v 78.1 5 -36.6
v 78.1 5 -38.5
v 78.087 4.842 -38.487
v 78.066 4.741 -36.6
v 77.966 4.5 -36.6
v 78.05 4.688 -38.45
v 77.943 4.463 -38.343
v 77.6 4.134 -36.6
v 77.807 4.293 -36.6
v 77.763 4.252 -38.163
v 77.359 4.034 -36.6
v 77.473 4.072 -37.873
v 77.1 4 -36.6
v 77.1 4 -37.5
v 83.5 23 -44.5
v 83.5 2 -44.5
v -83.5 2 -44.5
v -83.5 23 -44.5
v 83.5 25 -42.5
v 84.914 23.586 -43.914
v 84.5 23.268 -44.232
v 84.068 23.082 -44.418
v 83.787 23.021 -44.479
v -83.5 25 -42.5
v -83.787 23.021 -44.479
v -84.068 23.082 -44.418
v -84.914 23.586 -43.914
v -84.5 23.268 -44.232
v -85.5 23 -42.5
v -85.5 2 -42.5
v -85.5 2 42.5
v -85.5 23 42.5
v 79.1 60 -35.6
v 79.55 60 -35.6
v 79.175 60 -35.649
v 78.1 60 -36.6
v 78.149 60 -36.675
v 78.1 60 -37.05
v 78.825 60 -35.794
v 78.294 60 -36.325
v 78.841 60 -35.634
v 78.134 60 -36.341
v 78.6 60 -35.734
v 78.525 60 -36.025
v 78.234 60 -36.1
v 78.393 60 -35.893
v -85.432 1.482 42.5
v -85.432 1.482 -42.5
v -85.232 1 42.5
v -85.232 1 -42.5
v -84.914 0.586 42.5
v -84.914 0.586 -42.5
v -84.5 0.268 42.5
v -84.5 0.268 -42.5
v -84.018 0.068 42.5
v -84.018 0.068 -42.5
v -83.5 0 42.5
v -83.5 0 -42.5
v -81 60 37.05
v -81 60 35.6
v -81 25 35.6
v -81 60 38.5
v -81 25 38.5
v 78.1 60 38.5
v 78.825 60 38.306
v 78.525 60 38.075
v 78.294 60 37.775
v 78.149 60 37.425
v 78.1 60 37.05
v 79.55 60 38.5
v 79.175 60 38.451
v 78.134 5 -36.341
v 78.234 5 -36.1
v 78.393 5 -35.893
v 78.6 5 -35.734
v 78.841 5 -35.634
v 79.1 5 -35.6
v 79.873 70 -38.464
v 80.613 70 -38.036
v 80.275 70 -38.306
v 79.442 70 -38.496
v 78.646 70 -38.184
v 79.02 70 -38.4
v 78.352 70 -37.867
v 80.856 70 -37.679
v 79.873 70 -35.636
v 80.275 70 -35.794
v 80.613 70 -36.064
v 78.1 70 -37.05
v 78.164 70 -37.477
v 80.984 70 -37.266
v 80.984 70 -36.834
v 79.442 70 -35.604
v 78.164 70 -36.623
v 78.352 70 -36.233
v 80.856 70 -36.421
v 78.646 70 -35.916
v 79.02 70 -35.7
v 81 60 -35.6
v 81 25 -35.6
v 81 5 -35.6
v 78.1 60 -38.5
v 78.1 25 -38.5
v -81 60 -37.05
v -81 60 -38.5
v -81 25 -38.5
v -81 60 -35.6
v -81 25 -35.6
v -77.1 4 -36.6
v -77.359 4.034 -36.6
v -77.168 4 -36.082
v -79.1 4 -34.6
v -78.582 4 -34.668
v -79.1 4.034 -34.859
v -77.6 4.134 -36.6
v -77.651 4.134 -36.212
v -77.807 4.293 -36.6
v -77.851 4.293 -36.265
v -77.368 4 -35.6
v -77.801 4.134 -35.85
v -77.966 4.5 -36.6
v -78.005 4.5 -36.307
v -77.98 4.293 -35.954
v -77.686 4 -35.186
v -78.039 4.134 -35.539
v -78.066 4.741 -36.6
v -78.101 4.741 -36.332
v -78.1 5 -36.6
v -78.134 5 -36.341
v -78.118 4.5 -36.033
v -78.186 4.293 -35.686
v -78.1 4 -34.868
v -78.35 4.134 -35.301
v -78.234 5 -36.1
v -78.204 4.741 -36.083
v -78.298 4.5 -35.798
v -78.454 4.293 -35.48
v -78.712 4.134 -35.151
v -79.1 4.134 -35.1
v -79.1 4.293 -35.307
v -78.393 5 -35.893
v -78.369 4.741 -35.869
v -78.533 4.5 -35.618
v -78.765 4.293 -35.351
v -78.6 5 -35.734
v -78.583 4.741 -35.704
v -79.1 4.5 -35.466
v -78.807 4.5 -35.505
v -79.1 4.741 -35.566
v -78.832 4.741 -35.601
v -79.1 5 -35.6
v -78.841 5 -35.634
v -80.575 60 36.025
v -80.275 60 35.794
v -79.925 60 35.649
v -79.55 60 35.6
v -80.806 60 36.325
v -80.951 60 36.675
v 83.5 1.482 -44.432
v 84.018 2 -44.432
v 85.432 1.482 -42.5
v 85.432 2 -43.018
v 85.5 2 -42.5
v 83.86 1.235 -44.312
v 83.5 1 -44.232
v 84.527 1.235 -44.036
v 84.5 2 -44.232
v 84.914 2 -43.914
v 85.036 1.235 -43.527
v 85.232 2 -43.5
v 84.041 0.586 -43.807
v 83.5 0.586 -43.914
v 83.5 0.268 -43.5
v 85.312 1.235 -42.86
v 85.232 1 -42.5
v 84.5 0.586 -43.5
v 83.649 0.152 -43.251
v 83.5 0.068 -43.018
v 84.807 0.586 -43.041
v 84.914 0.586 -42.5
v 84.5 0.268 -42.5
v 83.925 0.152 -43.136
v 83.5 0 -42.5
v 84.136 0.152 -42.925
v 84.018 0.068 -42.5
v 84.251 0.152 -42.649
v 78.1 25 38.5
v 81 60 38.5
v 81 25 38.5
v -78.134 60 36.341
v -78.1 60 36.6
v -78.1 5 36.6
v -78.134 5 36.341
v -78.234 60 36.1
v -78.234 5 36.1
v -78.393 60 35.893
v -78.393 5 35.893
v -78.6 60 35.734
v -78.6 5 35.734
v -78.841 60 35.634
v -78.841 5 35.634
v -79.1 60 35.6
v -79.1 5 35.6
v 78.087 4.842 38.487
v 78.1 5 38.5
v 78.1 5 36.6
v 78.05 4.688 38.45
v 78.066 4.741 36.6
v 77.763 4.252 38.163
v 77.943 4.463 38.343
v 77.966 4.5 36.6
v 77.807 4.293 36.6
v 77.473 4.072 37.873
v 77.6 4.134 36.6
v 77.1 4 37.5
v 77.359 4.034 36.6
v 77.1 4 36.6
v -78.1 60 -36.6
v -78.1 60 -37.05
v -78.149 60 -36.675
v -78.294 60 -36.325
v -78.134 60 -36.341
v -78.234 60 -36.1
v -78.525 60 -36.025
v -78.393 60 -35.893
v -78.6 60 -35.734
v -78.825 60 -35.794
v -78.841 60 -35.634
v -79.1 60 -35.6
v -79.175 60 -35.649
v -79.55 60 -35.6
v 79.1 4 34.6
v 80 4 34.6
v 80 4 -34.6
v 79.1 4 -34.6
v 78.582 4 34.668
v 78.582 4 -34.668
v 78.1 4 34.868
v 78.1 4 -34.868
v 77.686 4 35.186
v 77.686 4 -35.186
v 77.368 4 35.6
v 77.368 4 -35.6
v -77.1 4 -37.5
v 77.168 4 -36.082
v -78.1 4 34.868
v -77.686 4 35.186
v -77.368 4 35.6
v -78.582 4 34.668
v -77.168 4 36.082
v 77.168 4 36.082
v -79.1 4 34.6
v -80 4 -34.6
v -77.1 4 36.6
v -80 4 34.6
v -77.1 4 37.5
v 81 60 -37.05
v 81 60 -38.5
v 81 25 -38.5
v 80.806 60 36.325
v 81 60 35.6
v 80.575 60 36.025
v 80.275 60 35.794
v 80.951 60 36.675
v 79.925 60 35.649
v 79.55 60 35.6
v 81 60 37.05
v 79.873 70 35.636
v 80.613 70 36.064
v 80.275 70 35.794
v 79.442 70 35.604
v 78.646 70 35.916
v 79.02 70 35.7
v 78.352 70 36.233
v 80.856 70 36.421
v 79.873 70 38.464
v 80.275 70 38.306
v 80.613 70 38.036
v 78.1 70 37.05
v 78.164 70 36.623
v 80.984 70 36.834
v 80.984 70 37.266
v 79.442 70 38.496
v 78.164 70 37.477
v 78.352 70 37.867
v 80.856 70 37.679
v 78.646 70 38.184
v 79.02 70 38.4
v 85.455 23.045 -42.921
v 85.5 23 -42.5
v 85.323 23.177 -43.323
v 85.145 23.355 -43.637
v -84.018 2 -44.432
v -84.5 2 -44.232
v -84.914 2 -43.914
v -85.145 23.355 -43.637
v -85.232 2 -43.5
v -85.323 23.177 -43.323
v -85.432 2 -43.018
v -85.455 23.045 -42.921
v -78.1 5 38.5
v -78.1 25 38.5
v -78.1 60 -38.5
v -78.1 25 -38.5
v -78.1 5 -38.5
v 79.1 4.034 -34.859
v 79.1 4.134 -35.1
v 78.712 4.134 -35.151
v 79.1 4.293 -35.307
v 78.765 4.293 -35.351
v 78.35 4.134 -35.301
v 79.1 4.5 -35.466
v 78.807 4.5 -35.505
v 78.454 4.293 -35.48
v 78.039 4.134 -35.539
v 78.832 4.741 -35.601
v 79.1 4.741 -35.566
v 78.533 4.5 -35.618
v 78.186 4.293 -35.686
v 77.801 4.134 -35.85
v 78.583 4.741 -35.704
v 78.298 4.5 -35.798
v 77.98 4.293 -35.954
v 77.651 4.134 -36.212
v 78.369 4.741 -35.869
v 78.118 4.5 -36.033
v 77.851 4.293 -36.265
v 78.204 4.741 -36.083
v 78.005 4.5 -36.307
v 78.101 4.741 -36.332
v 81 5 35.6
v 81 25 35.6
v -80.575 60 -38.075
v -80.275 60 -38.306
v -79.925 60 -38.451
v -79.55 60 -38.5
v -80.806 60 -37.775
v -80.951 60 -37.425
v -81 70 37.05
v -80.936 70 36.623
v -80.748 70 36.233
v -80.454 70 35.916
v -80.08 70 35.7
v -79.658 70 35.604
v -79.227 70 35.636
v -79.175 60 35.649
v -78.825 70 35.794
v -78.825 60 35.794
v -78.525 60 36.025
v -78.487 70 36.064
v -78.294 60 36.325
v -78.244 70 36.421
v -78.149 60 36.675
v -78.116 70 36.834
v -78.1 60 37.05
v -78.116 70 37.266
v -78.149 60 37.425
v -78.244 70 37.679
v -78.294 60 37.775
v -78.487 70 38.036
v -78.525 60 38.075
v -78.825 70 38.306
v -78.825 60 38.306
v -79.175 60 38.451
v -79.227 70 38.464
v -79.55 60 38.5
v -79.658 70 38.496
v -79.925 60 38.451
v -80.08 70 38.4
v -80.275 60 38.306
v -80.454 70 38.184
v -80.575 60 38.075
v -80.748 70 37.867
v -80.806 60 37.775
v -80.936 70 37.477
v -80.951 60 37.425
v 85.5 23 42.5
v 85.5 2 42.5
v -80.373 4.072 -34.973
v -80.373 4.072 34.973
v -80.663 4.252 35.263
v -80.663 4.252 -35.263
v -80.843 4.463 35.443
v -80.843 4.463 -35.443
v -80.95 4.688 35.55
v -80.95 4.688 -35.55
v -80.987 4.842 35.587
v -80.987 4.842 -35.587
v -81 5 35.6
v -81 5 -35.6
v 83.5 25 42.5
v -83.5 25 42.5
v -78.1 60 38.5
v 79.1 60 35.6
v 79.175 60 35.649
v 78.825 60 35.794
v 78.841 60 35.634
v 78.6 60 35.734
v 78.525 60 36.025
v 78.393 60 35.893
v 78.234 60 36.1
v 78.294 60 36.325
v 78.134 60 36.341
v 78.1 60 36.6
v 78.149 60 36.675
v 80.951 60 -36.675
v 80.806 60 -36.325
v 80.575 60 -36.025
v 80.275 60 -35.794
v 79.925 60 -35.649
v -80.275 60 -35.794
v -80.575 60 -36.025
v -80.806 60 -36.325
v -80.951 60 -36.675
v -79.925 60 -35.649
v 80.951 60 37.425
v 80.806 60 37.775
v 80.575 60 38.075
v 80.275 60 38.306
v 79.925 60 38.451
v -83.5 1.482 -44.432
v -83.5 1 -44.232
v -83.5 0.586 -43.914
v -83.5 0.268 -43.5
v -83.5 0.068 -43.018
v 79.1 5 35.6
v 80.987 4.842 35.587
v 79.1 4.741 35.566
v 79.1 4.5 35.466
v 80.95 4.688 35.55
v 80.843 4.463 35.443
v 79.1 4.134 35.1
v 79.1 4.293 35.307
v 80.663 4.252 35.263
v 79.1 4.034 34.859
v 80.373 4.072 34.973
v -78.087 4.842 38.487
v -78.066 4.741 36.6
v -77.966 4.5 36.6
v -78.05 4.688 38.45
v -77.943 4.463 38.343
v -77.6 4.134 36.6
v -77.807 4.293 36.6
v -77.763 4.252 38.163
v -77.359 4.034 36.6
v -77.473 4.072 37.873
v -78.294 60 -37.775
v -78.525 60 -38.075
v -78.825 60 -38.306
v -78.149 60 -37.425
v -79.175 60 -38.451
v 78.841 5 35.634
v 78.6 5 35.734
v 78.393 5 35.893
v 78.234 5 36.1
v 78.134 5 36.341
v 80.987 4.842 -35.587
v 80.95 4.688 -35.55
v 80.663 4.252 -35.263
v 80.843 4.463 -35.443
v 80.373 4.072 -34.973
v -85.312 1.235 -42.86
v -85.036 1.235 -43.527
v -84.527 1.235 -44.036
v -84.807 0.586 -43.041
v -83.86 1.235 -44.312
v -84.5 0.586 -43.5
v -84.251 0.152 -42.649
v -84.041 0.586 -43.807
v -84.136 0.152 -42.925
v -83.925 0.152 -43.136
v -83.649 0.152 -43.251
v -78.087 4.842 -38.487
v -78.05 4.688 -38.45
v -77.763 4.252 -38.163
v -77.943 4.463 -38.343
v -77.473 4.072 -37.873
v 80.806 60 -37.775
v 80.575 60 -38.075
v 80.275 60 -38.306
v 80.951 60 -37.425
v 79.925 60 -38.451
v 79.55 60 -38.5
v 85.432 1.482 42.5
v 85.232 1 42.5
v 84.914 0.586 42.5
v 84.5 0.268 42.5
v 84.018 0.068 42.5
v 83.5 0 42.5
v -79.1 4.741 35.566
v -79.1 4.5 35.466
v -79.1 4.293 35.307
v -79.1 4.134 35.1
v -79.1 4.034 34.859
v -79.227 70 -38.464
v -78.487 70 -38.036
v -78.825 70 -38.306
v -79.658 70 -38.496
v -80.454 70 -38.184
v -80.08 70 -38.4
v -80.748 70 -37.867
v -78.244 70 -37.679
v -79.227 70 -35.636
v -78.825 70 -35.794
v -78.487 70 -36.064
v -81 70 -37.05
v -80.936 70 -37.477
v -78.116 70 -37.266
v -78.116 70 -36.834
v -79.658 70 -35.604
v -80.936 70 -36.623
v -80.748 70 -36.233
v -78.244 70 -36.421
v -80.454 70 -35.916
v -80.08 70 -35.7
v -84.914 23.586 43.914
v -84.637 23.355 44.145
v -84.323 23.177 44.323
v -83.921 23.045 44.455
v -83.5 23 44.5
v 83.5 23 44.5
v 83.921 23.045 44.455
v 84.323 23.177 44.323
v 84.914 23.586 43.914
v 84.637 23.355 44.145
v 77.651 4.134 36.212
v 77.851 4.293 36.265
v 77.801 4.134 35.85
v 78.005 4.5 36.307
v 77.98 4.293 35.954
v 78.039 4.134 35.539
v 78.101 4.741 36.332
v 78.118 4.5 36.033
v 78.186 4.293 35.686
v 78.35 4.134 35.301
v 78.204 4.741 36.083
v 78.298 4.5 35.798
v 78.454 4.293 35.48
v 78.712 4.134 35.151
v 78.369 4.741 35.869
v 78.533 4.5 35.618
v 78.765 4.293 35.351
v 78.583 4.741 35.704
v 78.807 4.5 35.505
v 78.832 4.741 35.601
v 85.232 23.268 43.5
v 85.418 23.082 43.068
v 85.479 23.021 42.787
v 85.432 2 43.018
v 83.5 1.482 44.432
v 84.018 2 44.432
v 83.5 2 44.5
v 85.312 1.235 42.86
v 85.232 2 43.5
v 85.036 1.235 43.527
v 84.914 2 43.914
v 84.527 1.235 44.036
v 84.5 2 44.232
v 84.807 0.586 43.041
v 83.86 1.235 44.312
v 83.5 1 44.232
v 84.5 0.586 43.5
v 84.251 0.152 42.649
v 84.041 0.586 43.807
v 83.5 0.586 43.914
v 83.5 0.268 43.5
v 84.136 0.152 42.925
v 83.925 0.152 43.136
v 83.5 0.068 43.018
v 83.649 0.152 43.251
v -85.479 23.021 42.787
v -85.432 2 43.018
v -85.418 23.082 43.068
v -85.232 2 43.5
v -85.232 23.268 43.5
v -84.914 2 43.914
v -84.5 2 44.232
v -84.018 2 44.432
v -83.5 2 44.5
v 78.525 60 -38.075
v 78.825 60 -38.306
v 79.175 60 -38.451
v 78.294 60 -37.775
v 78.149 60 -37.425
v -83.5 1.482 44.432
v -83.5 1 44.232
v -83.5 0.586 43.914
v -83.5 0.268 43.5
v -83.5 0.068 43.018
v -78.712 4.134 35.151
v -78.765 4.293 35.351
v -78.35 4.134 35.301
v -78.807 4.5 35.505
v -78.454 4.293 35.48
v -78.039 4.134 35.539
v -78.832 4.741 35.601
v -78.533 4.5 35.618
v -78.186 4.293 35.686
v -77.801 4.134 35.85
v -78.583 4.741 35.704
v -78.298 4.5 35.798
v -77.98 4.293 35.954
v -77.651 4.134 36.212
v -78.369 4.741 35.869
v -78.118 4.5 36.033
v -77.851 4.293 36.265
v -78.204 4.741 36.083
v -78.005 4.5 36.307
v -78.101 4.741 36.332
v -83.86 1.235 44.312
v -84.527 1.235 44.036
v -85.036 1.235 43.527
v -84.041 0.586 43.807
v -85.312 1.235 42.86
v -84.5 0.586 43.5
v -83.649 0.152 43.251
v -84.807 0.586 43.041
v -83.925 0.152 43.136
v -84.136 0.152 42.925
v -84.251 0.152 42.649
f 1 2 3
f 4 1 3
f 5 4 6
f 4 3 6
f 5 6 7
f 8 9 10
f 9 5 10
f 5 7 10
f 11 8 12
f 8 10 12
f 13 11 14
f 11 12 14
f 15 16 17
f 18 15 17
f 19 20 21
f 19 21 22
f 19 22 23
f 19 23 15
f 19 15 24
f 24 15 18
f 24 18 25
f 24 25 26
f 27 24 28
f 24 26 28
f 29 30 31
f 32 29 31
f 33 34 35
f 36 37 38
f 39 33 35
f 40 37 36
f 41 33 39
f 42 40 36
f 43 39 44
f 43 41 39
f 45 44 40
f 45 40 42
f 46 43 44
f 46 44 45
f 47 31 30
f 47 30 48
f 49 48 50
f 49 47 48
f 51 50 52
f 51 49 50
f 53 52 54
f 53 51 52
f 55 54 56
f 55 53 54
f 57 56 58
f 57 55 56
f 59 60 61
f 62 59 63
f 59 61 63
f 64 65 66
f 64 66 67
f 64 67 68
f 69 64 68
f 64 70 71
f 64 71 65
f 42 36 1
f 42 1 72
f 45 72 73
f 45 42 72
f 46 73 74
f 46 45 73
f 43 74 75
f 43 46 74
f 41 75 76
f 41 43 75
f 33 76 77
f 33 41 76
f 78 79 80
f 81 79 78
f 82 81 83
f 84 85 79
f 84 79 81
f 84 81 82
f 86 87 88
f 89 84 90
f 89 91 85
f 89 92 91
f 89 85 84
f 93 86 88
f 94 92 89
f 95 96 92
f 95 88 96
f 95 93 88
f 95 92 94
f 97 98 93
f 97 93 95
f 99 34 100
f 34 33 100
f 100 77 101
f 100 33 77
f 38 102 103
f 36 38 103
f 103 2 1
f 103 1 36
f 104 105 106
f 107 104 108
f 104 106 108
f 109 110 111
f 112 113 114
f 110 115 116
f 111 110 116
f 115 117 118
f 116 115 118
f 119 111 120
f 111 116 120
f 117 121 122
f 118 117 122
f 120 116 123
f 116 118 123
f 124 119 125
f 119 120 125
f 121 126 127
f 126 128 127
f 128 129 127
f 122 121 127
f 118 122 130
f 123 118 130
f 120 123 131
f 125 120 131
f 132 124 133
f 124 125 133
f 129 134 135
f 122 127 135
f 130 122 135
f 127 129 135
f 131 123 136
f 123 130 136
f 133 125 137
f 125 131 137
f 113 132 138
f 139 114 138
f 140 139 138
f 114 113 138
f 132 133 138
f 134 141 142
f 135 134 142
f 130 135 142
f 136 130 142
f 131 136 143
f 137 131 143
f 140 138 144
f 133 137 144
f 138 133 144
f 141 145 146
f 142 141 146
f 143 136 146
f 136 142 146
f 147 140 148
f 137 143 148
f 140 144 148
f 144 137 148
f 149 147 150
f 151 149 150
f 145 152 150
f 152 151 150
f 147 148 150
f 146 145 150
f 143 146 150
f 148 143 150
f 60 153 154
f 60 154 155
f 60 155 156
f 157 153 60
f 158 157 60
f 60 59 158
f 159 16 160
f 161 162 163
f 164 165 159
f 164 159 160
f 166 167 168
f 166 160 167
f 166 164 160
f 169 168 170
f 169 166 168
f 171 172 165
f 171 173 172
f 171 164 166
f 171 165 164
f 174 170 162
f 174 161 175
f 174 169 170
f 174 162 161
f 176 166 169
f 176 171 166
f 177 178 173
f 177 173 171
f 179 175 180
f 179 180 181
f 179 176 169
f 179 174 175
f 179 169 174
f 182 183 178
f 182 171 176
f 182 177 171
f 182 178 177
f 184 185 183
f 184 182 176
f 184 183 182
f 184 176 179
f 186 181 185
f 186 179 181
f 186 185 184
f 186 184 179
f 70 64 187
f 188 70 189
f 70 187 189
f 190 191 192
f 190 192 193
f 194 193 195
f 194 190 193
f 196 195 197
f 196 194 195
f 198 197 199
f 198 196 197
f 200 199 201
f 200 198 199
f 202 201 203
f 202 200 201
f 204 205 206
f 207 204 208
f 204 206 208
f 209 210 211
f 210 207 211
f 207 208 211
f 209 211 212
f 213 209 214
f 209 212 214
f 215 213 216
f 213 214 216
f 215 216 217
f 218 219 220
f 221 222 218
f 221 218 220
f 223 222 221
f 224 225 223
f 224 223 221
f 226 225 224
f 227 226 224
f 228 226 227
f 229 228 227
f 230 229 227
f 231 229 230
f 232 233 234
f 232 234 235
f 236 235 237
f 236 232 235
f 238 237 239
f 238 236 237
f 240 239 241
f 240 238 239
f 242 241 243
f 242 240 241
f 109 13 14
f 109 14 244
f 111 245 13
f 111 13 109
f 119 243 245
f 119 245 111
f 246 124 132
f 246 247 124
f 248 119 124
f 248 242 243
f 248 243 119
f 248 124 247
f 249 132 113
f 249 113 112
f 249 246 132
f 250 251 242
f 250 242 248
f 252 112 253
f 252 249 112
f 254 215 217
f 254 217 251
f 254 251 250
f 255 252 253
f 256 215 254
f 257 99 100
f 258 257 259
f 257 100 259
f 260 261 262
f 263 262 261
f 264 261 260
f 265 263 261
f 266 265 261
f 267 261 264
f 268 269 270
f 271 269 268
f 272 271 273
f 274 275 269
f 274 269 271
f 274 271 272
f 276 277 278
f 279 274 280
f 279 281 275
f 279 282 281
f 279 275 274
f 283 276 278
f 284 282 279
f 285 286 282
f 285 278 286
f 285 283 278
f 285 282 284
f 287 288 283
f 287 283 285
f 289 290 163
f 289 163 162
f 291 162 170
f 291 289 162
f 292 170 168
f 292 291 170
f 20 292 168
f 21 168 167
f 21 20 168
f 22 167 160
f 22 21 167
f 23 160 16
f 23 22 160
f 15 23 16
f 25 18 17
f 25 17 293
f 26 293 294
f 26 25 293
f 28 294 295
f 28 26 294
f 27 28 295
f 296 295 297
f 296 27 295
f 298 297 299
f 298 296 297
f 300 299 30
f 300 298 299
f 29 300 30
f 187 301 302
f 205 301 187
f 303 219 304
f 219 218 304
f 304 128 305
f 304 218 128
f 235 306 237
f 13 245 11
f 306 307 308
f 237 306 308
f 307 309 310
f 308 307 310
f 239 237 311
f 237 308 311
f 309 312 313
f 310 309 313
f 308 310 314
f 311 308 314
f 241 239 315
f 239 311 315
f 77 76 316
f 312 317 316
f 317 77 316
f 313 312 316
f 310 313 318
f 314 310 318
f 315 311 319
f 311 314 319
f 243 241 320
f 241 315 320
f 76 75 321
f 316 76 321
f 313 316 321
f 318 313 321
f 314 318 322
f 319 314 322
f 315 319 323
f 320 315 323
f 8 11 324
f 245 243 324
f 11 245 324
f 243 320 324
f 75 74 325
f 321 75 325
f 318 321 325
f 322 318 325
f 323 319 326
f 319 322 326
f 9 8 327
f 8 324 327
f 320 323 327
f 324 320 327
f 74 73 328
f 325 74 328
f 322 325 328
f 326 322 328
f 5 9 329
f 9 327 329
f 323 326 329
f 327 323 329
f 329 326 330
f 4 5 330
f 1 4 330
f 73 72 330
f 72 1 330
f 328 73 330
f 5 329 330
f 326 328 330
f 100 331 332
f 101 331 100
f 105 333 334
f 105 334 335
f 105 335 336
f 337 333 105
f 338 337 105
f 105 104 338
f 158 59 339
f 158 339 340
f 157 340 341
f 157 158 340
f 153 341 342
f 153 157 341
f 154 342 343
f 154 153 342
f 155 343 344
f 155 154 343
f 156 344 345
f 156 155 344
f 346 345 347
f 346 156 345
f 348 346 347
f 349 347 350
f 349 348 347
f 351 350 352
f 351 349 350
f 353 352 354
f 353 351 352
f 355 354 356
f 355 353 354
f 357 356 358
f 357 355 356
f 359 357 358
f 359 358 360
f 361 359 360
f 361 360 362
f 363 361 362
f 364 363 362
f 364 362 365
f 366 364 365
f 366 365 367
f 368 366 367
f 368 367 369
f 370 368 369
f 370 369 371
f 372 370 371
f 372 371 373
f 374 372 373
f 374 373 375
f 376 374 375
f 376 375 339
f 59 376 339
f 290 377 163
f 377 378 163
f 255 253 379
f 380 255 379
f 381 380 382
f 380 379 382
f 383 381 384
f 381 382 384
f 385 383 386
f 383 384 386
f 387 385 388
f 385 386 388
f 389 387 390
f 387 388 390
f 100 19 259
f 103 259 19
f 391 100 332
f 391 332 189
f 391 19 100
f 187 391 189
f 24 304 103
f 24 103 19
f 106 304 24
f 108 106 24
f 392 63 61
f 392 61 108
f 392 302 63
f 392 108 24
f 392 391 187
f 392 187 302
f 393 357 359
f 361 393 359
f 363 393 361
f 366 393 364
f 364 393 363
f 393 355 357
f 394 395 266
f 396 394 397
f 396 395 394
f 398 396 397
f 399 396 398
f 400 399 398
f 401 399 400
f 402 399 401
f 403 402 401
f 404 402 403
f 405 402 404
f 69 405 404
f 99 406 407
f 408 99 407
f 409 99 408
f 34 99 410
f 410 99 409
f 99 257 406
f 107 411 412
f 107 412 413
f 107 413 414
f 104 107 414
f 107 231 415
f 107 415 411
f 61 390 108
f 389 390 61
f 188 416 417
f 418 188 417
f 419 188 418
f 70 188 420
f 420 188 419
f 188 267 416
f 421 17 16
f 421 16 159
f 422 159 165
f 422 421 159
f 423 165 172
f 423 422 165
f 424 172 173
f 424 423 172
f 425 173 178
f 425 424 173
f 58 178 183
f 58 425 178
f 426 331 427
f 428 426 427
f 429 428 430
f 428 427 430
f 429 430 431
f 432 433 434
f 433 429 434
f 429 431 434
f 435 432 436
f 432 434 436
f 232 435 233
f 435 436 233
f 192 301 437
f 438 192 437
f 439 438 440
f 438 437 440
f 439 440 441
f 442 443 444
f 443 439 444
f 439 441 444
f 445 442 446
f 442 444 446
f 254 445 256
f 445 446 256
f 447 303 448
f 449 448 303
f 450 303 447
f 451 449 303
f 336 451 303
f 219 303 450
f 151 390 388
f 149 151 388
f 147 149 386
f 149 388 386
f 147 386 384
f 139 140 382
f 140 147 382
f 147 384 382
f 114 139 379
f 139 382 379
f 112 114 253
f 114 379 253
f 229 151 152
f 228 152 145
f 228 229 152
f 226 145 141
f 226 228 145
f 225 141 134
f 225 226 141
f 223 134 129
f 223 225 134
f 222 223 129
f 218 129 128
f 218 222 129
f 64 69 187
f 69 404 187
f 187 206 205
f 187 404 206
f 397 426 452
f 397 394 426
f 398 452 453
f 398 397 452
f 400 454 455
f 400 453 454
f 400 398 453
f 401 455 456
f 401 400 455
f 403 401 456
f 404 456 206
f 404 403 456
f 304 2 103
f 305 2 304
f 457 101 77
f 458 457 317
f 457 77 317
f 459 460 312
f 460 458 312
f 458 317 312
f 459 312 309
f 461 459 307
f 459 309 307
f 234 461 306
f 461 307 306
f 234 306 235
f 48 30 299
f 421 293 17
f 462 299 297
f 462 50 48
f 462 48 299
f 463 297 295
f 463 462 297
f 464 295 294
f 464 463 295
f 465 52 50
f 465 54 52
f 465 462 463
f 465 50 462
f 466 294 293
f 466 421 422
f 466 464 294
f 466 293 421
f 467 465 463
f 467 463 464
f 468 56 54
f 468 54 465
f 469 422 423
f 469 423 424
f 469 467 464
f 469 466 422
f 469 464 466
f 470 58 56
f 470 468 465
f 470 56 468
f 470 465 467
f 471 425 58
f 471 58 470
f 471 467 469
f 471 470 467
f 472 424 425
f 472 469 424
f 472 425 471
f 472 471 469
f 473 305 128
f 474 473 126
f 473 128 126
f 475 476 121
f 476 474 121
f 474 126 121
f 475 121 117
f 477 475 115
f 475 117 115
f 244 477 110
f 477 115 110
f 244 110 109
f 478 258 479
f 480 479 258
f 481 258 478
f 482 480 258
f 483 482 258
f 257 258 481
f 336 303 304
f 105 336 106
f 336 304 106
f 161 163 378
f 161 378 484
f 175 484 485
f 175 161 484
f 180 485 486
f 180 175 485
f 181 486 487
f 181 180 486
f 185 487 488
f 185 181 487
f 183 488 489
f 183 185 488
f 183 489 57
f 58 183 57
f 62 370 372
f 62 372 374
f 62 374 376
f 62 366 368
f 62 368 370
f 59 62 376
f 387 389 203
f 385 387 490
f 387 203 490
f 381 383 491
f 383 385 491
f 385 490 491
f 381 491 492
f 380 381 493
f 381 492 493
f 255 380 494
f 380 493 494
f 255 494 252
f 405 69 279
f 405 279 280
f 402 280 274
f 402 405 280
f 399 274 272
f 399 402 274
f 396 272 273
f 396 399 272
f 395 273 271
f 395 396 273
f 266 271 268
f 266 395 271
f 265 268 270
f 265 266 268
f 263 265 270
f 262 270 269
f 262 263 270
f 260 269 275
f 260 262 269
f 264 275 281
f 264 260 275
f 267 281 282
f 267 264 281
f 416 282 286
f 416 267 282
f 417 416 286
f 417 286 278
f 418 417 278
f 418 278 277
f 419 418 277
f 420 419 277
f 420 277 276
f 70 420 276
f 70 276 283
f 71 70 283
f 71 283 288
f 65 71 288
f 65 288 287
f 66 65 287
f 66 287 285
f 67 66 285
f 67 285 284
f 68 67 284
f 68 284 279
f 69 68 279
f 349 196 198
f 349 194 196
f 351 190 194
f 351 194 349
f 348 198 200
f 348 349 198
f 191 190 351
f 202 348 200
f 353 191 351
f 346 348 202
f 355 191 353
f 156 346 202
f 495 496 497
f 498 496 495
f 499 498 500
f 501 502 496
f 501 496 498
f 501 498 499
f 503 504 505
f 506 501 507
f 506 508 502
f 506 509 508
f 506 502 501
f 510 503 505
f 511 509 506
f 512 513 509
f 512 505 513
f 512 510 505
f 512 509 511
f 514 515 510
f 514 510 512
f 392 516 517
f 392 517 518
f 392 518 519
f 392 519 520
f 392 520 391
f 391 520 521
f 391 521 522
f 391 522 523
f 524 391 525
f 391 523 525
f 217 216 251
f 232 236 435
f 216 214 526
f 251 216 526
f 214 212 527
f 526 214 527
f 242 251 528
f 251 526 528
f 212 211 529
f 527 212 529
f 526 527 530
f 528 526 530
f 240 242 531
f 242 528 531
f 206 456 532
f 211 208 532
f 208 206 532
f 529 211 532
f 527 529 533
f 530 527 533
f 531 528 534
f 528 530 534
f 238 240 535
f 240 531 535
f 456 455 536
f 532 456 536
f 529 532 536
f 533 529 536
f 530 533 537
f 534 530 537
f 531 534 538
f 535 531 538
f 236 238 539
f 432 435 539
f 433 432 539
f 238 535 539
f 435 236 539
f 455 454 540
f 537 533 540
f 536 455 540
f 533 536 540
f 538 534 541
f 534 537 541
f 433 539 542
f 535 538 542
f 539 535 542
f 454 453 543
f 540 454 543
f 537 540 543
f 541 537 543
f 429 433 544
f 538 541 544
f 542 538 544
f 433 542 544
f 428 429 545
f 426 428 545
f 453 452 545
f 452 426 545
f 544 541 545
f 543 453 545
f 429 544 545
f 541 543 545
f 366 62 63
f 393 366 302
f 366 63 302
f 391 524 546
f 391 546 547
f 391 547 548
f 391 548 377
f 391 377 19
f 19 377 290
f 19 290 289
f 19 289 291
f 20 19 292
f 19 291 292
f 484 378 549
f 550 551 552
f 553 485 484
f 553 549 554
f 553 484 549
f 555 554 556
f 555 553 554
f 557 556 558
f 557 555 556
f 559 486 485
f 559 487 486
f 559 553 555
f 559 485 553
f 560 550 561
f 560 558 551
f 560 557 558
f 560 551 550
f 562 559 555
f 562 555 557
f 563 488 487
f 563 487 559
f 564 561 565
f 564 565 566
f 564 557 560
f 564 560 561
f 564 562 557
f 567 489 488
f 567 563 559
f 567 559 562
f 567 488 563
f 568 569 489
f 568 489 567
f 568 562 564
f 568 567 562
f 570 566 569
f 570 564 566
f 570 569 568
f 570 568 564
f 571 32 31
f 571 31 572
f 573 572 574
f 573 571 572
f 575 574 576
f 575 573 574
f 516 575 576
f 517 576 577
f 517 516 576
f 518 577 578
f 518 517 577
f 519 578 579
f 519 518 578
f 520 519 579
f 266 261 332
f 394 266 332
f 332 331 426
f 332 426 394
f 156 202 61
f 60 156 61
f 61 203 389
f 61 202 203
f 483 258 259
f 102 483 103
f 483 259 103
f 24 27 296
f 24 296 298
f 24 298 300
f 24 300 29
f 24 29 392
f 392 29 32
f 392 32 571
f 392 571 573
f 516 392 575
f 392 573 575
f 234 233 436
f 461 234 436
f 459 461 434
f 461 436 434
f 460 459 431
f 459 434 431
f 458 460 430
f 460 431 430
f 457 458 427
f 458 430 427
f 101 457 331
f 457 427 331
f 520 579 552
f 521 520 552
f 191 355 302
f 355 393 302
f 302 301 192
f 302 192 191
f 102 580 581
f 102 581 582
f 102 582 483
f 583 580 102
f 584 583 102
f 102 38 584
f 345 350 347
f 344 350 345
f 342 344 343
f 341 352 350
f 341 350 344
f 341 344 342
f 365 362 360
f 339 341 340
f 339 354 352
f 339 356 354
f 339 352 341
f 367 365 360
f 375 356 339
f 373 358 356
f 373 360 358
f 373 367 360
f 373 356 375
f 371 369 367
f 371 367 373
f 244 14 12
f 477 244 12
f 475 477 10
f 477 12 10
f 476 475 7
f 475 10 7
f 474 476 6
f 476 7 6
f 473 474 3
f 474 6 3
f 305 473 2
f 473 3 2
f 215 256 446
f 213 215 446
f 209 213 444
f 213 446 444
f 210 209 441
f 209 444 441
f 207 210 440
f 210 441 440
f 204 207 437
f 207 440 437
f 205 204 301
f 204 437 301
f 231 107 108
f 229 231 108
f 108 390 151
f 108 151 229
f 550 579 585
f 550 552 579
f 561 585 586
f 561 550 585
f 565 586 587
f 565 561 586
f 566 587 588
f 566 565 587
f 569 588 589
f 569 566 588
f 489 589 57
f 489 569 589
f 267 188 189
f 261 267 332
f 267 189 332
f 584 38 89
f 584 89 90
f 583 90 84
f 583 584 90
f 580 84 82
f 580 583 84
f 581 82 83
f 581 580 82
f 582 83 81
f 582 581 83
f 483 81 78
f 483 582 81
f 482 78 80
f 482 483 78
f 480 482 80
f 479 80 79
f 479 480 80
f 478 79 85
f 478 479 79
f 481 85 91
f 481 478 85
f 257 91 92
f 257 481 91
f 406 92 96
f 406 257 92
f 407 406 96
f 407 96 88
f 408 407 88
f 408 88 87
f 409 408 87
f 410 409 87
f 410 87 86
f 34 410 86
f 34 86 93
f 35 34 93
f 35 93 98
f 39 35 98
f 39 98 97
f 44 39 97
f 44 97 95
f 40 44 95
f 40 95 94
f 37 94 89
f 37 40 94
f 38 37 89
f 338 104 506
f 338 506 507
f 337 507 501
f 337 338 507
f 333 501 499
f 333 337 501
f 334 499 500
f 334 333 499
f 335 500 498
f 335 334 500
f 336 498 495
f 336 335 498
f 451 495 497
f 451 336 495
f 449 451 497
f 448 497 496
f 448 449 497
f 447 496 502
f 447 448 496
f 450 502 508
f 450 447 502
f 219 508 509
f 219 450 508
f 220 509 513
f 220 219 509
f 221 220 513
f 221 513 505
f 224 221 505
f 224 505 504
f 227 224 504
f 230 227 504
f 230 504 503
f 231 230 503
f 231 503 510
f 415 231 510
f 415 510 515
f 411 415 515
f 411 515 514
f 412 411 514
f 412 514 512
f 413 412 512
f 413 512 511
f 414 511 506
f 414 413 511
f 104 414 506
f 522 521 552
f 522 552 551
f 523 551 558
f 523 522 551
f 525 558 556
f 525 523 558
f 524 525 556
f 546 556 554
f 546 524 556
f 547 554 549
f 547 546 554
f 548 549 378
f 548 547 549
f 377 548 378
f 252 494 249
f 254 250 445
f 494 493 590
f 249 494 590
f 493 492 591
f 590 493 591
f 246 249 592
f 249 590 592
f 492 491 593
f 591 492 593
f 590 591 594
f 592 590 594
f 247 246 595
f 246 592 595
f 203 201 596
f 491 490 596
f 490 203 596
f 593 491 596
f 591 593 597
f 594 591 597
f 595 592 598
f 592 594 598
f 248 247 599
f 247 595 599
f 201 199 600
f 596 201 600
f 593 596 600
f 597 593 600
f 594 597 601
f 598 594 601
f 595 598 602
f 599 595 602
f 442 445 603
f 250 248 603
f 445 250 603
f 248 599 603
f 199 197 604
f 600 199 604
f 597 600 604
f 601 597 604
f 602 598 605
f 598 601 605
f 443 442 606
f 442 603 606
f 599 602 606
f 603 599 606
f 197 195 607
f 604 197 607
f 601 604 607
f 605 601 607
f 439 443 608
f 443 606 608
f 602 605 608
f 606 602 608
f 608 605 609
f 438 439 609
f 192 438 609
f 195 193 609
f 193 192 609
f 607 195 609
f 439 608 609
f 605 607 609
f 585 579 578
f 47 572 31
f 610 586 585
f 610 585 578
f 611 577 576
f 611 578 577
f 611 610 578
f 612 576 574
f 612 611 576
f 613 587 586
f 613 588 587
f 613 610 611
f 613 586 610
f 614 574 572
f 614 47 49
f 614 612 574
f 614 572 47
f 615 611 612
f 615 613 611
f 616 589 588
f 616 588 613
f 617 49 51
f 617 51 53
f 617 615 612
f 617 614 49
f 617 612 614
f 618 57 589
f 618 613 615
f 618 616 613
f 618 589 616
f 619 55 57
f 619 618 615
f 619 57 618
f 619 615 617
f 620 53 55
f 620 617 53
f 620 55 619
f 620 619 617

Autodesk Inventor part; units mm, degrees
ref_plane "YZ Plane" through (0, 0, 0) normal (1, 0, 0) x (0, 1, 0)
ref_plane "XZ Plane" through (0, 0, 0) normal (0, 1, 0) x (-1, 0, 0)
ref_plane "XY Plane" through (0, 0, 0) normal (0, 0, 1) x (1, 0, 0)
sketch "Sketch1" plane through (0, 0, 0) normal (0, 1, 0) x (-1, 0, 0)
  line L0 (-85.5, -44.5) -> (85.5, -44.5)
  line L1 (85.5, -44.5) -> (85.5, 44.5)
  line L2 (85.5, 44.5) -> (-85.5, 44.5)
  line L3 (-85.5, 44.5) -> (-85.5, -44.5)
  line L4 (-85.5, -44.5) -> (85.5, 44.5) construction
  line L5 (85.5, -44.5) -> (-85.5, 44.5) construction
  line L6 (-81, -38.5) -> (81, -38.5)
  line L7 (81, -38.5) -> (81, 38.5)
  line L8 (81, 38.5) -> (-81, 38.5)
  line L9 (-81, 38.5) -> (-81, -38.5)
  line L10 (-81, -38.5) -> (81, 38.5) construction
  line L11 (81, -38.5) -> (-81, 38.5) construction
  line L12 (81, 38.5) -> (79.55, 38.5)
  line L13 (81, 37.05) -> (81, 38.5)
  circle A0 centre (79.55, 37.05) radius 1.45
  circle A1 centre (79.55, -37.05) radius 1.45
  circle A2 centre (-79.55, -37.05) radius 1.45
  circle A3 centre (-79.55, 37.05) radius 1.45
  line L14 (81, 38.5) -> (78.1, 38.5)
  line L15 (78.1, 38.5) -> (78.1, 35.6)
  line L16 (78.1, 35.6) -> (81, 35.6)
  line L17 (81, 35.6) -> (81, 38.5)
  line L18 (81, 38.5) -> (78.1, 35.6) construction
  line L19 (78.1, 38.5) -> (81, 35.6) construction
  line L20 (81, -35.6) -> (78.1, -35.6)
  line L21 (78.1, -35.6) -> (78.1, -38.5)
  line L22 (78.1, -38.5) -> (81, -38.5)
  line L23 (81, -38.5) -> (81, -35.6)
  line L24 (81, -35.6) -> (78.1, -38.5) construction
  line L25 (78.1, -35.6) -> (81, -38.5) construction
  line L26 (-78.1, -35.6) -> (-81, -35.6)
  line L27 (-81, -35.6) -> (-81, -38.5)
  line L28 (-81, -38.5) -> (-78.1, -38.5)
  line L29 (-78.1, -38.5) -> (-78.1, -35.6)
  line L30 (-78.1, -35.6) -> (-81, -38.5) construction
  line L31 (-81, -35.6) -> (-78.1, -38.5) construction
  line L32 (-78.1, 38.5) -> (-81, 38.5)
  line L33 (-81, 38.5) -> (-81, 35.6)
  line L34 (-81, 35.6) -> (-78.1, 35.6)
  line L35 (-78.1, 35.6) -> (-78.1, 38.5)
  line L36 (-78.1, 38.5) -> (-81, 35.6) construction
  line L37 (-81, 38.5) -> (-78.1, 35.6) construction
  point P0 (0, 0)
  point P1 (-79.55, 38.5)
  point P2 (-81, 37.05)
  point P3 (-81, -37.05)
  point P4 (-79.55, -38.5)
  point P5 (79.55, -38.5)
  point P6 (81, -37.05)
  dimension "d0" = 171
  dimension "d1" = 89
  dimension "d2" = 162
  dimension "d3" = 77
  dimension "d7" = 2.9
  dimension "d8" = 2.9
  dimension "d9" = 2.9
  dimension "d10" = 2.9
extrude "Extrusion1" add sketch "Sketch1" along normal blind 70 contours A2 | A1 | A3 | A0
extrude "Extrusion2" add sketch "Sketch1" along normal blind 4 contours L29 L26 L9 L34 L35 L8 L15 L16 L7 L20 L21 L6 | L6 A2 L29 | L21 A1 L6 | A2 L26 L29 | L21 L20 A1 | L9 L26 A2 | A1 L20 L7 | L9 A3 L34 | L16 A0 L7 | A3 L35 L34 | L16 L15 A0 | L8 L35 A3 | A0 L15 L8
extrude "Extrusion3" add sketch "Sketch1" along normal blind 25
extrude "Extrusion4" add sketch "Sketch1" along normal blind 60 contours L6 L9 A2
extrude "Extrusion5" add sketch "Sketch1" along normal blind 60 contours L6 A2 L29 | L6 L9 A2 | A2 | A2 L26 L29 | L9 L26 A2
extrude "Extrusion6" add sketch "Sketch1" along normal blind 60 contours L9 A3 L34 | L9 L8 A3 | A3 | A3 L35 L34 | L8 L35 A3
extrude "Extrusion7" add sketch "Sketch1" along normal blind 60 contours L16 A0 L7 | A0 L8 L7 | A0 | L16 L15 A0 | A0 L15 L8
extrude "Extrusion8" add sketch "Sketch1" along normal blind 60 contours L21 A1 L6 | A1 L7 L6 | A1 | L21 L20 A1 | A1 L20 L7
fillet "Fillet1" radius 1 1 edges at (-78.1, 32, -35.6)
fillet "Fillet2" radius 1 1 edges at (-78.1, 32, 35.6)
fillet "Fillet3" radius 1 1 edges at (78.1, 32, 35.6)
fillet "Fillet4" radius 1 1 edges at (78.1, 32, -35.6)
fillet "Fillet5" radius 1 16 edges at (-81, 4, 0) (-78.1, 4, -37.55) (-80.05, 4, -35.6) (-78.3929, 4, -35.8929) (0, 4, -38.5) (0, 4, 38.5) (-78.3929, 4, 35.8929) (-80.05, 4, 35.6) (-78.1, 4, 37.55) (80.05, 4, -35.6) (78.1, 4, -37.55) (78.3929, 4, -35.8929) (81, 4, 0) (78.3929, 4, 35.8929) (80.05, 4, 35.6) (78.1, 4, 37.55)
chamfer "Chamfer1" distance 2 angle 45 4 edges at (0, 25, 44.5) (85.5, 25, 0) (0, 25, -44.5) (-85.5, 25, 0)
fillet "Fillet6" radius 2 1 edges at (85.5, 11.5, 44.5)
fillet "Fillet7" radius 2 1 edges at (85.5, 11.5, -44.5)
fillet "Fillet8" radius 2 1 edges at (-85.5, 11.5, 44.5)
fillet "Fillet9" radius 2 1 edges at (-85.5, 11.5, -44.5)
fillet "Fillet10" radius 2 4 edges at (-85.5, 0, 0) (0, 0, 44.5) (85.5, 0, 0) (0, 0, -44.5)
properties part number "Buggy_Body"
